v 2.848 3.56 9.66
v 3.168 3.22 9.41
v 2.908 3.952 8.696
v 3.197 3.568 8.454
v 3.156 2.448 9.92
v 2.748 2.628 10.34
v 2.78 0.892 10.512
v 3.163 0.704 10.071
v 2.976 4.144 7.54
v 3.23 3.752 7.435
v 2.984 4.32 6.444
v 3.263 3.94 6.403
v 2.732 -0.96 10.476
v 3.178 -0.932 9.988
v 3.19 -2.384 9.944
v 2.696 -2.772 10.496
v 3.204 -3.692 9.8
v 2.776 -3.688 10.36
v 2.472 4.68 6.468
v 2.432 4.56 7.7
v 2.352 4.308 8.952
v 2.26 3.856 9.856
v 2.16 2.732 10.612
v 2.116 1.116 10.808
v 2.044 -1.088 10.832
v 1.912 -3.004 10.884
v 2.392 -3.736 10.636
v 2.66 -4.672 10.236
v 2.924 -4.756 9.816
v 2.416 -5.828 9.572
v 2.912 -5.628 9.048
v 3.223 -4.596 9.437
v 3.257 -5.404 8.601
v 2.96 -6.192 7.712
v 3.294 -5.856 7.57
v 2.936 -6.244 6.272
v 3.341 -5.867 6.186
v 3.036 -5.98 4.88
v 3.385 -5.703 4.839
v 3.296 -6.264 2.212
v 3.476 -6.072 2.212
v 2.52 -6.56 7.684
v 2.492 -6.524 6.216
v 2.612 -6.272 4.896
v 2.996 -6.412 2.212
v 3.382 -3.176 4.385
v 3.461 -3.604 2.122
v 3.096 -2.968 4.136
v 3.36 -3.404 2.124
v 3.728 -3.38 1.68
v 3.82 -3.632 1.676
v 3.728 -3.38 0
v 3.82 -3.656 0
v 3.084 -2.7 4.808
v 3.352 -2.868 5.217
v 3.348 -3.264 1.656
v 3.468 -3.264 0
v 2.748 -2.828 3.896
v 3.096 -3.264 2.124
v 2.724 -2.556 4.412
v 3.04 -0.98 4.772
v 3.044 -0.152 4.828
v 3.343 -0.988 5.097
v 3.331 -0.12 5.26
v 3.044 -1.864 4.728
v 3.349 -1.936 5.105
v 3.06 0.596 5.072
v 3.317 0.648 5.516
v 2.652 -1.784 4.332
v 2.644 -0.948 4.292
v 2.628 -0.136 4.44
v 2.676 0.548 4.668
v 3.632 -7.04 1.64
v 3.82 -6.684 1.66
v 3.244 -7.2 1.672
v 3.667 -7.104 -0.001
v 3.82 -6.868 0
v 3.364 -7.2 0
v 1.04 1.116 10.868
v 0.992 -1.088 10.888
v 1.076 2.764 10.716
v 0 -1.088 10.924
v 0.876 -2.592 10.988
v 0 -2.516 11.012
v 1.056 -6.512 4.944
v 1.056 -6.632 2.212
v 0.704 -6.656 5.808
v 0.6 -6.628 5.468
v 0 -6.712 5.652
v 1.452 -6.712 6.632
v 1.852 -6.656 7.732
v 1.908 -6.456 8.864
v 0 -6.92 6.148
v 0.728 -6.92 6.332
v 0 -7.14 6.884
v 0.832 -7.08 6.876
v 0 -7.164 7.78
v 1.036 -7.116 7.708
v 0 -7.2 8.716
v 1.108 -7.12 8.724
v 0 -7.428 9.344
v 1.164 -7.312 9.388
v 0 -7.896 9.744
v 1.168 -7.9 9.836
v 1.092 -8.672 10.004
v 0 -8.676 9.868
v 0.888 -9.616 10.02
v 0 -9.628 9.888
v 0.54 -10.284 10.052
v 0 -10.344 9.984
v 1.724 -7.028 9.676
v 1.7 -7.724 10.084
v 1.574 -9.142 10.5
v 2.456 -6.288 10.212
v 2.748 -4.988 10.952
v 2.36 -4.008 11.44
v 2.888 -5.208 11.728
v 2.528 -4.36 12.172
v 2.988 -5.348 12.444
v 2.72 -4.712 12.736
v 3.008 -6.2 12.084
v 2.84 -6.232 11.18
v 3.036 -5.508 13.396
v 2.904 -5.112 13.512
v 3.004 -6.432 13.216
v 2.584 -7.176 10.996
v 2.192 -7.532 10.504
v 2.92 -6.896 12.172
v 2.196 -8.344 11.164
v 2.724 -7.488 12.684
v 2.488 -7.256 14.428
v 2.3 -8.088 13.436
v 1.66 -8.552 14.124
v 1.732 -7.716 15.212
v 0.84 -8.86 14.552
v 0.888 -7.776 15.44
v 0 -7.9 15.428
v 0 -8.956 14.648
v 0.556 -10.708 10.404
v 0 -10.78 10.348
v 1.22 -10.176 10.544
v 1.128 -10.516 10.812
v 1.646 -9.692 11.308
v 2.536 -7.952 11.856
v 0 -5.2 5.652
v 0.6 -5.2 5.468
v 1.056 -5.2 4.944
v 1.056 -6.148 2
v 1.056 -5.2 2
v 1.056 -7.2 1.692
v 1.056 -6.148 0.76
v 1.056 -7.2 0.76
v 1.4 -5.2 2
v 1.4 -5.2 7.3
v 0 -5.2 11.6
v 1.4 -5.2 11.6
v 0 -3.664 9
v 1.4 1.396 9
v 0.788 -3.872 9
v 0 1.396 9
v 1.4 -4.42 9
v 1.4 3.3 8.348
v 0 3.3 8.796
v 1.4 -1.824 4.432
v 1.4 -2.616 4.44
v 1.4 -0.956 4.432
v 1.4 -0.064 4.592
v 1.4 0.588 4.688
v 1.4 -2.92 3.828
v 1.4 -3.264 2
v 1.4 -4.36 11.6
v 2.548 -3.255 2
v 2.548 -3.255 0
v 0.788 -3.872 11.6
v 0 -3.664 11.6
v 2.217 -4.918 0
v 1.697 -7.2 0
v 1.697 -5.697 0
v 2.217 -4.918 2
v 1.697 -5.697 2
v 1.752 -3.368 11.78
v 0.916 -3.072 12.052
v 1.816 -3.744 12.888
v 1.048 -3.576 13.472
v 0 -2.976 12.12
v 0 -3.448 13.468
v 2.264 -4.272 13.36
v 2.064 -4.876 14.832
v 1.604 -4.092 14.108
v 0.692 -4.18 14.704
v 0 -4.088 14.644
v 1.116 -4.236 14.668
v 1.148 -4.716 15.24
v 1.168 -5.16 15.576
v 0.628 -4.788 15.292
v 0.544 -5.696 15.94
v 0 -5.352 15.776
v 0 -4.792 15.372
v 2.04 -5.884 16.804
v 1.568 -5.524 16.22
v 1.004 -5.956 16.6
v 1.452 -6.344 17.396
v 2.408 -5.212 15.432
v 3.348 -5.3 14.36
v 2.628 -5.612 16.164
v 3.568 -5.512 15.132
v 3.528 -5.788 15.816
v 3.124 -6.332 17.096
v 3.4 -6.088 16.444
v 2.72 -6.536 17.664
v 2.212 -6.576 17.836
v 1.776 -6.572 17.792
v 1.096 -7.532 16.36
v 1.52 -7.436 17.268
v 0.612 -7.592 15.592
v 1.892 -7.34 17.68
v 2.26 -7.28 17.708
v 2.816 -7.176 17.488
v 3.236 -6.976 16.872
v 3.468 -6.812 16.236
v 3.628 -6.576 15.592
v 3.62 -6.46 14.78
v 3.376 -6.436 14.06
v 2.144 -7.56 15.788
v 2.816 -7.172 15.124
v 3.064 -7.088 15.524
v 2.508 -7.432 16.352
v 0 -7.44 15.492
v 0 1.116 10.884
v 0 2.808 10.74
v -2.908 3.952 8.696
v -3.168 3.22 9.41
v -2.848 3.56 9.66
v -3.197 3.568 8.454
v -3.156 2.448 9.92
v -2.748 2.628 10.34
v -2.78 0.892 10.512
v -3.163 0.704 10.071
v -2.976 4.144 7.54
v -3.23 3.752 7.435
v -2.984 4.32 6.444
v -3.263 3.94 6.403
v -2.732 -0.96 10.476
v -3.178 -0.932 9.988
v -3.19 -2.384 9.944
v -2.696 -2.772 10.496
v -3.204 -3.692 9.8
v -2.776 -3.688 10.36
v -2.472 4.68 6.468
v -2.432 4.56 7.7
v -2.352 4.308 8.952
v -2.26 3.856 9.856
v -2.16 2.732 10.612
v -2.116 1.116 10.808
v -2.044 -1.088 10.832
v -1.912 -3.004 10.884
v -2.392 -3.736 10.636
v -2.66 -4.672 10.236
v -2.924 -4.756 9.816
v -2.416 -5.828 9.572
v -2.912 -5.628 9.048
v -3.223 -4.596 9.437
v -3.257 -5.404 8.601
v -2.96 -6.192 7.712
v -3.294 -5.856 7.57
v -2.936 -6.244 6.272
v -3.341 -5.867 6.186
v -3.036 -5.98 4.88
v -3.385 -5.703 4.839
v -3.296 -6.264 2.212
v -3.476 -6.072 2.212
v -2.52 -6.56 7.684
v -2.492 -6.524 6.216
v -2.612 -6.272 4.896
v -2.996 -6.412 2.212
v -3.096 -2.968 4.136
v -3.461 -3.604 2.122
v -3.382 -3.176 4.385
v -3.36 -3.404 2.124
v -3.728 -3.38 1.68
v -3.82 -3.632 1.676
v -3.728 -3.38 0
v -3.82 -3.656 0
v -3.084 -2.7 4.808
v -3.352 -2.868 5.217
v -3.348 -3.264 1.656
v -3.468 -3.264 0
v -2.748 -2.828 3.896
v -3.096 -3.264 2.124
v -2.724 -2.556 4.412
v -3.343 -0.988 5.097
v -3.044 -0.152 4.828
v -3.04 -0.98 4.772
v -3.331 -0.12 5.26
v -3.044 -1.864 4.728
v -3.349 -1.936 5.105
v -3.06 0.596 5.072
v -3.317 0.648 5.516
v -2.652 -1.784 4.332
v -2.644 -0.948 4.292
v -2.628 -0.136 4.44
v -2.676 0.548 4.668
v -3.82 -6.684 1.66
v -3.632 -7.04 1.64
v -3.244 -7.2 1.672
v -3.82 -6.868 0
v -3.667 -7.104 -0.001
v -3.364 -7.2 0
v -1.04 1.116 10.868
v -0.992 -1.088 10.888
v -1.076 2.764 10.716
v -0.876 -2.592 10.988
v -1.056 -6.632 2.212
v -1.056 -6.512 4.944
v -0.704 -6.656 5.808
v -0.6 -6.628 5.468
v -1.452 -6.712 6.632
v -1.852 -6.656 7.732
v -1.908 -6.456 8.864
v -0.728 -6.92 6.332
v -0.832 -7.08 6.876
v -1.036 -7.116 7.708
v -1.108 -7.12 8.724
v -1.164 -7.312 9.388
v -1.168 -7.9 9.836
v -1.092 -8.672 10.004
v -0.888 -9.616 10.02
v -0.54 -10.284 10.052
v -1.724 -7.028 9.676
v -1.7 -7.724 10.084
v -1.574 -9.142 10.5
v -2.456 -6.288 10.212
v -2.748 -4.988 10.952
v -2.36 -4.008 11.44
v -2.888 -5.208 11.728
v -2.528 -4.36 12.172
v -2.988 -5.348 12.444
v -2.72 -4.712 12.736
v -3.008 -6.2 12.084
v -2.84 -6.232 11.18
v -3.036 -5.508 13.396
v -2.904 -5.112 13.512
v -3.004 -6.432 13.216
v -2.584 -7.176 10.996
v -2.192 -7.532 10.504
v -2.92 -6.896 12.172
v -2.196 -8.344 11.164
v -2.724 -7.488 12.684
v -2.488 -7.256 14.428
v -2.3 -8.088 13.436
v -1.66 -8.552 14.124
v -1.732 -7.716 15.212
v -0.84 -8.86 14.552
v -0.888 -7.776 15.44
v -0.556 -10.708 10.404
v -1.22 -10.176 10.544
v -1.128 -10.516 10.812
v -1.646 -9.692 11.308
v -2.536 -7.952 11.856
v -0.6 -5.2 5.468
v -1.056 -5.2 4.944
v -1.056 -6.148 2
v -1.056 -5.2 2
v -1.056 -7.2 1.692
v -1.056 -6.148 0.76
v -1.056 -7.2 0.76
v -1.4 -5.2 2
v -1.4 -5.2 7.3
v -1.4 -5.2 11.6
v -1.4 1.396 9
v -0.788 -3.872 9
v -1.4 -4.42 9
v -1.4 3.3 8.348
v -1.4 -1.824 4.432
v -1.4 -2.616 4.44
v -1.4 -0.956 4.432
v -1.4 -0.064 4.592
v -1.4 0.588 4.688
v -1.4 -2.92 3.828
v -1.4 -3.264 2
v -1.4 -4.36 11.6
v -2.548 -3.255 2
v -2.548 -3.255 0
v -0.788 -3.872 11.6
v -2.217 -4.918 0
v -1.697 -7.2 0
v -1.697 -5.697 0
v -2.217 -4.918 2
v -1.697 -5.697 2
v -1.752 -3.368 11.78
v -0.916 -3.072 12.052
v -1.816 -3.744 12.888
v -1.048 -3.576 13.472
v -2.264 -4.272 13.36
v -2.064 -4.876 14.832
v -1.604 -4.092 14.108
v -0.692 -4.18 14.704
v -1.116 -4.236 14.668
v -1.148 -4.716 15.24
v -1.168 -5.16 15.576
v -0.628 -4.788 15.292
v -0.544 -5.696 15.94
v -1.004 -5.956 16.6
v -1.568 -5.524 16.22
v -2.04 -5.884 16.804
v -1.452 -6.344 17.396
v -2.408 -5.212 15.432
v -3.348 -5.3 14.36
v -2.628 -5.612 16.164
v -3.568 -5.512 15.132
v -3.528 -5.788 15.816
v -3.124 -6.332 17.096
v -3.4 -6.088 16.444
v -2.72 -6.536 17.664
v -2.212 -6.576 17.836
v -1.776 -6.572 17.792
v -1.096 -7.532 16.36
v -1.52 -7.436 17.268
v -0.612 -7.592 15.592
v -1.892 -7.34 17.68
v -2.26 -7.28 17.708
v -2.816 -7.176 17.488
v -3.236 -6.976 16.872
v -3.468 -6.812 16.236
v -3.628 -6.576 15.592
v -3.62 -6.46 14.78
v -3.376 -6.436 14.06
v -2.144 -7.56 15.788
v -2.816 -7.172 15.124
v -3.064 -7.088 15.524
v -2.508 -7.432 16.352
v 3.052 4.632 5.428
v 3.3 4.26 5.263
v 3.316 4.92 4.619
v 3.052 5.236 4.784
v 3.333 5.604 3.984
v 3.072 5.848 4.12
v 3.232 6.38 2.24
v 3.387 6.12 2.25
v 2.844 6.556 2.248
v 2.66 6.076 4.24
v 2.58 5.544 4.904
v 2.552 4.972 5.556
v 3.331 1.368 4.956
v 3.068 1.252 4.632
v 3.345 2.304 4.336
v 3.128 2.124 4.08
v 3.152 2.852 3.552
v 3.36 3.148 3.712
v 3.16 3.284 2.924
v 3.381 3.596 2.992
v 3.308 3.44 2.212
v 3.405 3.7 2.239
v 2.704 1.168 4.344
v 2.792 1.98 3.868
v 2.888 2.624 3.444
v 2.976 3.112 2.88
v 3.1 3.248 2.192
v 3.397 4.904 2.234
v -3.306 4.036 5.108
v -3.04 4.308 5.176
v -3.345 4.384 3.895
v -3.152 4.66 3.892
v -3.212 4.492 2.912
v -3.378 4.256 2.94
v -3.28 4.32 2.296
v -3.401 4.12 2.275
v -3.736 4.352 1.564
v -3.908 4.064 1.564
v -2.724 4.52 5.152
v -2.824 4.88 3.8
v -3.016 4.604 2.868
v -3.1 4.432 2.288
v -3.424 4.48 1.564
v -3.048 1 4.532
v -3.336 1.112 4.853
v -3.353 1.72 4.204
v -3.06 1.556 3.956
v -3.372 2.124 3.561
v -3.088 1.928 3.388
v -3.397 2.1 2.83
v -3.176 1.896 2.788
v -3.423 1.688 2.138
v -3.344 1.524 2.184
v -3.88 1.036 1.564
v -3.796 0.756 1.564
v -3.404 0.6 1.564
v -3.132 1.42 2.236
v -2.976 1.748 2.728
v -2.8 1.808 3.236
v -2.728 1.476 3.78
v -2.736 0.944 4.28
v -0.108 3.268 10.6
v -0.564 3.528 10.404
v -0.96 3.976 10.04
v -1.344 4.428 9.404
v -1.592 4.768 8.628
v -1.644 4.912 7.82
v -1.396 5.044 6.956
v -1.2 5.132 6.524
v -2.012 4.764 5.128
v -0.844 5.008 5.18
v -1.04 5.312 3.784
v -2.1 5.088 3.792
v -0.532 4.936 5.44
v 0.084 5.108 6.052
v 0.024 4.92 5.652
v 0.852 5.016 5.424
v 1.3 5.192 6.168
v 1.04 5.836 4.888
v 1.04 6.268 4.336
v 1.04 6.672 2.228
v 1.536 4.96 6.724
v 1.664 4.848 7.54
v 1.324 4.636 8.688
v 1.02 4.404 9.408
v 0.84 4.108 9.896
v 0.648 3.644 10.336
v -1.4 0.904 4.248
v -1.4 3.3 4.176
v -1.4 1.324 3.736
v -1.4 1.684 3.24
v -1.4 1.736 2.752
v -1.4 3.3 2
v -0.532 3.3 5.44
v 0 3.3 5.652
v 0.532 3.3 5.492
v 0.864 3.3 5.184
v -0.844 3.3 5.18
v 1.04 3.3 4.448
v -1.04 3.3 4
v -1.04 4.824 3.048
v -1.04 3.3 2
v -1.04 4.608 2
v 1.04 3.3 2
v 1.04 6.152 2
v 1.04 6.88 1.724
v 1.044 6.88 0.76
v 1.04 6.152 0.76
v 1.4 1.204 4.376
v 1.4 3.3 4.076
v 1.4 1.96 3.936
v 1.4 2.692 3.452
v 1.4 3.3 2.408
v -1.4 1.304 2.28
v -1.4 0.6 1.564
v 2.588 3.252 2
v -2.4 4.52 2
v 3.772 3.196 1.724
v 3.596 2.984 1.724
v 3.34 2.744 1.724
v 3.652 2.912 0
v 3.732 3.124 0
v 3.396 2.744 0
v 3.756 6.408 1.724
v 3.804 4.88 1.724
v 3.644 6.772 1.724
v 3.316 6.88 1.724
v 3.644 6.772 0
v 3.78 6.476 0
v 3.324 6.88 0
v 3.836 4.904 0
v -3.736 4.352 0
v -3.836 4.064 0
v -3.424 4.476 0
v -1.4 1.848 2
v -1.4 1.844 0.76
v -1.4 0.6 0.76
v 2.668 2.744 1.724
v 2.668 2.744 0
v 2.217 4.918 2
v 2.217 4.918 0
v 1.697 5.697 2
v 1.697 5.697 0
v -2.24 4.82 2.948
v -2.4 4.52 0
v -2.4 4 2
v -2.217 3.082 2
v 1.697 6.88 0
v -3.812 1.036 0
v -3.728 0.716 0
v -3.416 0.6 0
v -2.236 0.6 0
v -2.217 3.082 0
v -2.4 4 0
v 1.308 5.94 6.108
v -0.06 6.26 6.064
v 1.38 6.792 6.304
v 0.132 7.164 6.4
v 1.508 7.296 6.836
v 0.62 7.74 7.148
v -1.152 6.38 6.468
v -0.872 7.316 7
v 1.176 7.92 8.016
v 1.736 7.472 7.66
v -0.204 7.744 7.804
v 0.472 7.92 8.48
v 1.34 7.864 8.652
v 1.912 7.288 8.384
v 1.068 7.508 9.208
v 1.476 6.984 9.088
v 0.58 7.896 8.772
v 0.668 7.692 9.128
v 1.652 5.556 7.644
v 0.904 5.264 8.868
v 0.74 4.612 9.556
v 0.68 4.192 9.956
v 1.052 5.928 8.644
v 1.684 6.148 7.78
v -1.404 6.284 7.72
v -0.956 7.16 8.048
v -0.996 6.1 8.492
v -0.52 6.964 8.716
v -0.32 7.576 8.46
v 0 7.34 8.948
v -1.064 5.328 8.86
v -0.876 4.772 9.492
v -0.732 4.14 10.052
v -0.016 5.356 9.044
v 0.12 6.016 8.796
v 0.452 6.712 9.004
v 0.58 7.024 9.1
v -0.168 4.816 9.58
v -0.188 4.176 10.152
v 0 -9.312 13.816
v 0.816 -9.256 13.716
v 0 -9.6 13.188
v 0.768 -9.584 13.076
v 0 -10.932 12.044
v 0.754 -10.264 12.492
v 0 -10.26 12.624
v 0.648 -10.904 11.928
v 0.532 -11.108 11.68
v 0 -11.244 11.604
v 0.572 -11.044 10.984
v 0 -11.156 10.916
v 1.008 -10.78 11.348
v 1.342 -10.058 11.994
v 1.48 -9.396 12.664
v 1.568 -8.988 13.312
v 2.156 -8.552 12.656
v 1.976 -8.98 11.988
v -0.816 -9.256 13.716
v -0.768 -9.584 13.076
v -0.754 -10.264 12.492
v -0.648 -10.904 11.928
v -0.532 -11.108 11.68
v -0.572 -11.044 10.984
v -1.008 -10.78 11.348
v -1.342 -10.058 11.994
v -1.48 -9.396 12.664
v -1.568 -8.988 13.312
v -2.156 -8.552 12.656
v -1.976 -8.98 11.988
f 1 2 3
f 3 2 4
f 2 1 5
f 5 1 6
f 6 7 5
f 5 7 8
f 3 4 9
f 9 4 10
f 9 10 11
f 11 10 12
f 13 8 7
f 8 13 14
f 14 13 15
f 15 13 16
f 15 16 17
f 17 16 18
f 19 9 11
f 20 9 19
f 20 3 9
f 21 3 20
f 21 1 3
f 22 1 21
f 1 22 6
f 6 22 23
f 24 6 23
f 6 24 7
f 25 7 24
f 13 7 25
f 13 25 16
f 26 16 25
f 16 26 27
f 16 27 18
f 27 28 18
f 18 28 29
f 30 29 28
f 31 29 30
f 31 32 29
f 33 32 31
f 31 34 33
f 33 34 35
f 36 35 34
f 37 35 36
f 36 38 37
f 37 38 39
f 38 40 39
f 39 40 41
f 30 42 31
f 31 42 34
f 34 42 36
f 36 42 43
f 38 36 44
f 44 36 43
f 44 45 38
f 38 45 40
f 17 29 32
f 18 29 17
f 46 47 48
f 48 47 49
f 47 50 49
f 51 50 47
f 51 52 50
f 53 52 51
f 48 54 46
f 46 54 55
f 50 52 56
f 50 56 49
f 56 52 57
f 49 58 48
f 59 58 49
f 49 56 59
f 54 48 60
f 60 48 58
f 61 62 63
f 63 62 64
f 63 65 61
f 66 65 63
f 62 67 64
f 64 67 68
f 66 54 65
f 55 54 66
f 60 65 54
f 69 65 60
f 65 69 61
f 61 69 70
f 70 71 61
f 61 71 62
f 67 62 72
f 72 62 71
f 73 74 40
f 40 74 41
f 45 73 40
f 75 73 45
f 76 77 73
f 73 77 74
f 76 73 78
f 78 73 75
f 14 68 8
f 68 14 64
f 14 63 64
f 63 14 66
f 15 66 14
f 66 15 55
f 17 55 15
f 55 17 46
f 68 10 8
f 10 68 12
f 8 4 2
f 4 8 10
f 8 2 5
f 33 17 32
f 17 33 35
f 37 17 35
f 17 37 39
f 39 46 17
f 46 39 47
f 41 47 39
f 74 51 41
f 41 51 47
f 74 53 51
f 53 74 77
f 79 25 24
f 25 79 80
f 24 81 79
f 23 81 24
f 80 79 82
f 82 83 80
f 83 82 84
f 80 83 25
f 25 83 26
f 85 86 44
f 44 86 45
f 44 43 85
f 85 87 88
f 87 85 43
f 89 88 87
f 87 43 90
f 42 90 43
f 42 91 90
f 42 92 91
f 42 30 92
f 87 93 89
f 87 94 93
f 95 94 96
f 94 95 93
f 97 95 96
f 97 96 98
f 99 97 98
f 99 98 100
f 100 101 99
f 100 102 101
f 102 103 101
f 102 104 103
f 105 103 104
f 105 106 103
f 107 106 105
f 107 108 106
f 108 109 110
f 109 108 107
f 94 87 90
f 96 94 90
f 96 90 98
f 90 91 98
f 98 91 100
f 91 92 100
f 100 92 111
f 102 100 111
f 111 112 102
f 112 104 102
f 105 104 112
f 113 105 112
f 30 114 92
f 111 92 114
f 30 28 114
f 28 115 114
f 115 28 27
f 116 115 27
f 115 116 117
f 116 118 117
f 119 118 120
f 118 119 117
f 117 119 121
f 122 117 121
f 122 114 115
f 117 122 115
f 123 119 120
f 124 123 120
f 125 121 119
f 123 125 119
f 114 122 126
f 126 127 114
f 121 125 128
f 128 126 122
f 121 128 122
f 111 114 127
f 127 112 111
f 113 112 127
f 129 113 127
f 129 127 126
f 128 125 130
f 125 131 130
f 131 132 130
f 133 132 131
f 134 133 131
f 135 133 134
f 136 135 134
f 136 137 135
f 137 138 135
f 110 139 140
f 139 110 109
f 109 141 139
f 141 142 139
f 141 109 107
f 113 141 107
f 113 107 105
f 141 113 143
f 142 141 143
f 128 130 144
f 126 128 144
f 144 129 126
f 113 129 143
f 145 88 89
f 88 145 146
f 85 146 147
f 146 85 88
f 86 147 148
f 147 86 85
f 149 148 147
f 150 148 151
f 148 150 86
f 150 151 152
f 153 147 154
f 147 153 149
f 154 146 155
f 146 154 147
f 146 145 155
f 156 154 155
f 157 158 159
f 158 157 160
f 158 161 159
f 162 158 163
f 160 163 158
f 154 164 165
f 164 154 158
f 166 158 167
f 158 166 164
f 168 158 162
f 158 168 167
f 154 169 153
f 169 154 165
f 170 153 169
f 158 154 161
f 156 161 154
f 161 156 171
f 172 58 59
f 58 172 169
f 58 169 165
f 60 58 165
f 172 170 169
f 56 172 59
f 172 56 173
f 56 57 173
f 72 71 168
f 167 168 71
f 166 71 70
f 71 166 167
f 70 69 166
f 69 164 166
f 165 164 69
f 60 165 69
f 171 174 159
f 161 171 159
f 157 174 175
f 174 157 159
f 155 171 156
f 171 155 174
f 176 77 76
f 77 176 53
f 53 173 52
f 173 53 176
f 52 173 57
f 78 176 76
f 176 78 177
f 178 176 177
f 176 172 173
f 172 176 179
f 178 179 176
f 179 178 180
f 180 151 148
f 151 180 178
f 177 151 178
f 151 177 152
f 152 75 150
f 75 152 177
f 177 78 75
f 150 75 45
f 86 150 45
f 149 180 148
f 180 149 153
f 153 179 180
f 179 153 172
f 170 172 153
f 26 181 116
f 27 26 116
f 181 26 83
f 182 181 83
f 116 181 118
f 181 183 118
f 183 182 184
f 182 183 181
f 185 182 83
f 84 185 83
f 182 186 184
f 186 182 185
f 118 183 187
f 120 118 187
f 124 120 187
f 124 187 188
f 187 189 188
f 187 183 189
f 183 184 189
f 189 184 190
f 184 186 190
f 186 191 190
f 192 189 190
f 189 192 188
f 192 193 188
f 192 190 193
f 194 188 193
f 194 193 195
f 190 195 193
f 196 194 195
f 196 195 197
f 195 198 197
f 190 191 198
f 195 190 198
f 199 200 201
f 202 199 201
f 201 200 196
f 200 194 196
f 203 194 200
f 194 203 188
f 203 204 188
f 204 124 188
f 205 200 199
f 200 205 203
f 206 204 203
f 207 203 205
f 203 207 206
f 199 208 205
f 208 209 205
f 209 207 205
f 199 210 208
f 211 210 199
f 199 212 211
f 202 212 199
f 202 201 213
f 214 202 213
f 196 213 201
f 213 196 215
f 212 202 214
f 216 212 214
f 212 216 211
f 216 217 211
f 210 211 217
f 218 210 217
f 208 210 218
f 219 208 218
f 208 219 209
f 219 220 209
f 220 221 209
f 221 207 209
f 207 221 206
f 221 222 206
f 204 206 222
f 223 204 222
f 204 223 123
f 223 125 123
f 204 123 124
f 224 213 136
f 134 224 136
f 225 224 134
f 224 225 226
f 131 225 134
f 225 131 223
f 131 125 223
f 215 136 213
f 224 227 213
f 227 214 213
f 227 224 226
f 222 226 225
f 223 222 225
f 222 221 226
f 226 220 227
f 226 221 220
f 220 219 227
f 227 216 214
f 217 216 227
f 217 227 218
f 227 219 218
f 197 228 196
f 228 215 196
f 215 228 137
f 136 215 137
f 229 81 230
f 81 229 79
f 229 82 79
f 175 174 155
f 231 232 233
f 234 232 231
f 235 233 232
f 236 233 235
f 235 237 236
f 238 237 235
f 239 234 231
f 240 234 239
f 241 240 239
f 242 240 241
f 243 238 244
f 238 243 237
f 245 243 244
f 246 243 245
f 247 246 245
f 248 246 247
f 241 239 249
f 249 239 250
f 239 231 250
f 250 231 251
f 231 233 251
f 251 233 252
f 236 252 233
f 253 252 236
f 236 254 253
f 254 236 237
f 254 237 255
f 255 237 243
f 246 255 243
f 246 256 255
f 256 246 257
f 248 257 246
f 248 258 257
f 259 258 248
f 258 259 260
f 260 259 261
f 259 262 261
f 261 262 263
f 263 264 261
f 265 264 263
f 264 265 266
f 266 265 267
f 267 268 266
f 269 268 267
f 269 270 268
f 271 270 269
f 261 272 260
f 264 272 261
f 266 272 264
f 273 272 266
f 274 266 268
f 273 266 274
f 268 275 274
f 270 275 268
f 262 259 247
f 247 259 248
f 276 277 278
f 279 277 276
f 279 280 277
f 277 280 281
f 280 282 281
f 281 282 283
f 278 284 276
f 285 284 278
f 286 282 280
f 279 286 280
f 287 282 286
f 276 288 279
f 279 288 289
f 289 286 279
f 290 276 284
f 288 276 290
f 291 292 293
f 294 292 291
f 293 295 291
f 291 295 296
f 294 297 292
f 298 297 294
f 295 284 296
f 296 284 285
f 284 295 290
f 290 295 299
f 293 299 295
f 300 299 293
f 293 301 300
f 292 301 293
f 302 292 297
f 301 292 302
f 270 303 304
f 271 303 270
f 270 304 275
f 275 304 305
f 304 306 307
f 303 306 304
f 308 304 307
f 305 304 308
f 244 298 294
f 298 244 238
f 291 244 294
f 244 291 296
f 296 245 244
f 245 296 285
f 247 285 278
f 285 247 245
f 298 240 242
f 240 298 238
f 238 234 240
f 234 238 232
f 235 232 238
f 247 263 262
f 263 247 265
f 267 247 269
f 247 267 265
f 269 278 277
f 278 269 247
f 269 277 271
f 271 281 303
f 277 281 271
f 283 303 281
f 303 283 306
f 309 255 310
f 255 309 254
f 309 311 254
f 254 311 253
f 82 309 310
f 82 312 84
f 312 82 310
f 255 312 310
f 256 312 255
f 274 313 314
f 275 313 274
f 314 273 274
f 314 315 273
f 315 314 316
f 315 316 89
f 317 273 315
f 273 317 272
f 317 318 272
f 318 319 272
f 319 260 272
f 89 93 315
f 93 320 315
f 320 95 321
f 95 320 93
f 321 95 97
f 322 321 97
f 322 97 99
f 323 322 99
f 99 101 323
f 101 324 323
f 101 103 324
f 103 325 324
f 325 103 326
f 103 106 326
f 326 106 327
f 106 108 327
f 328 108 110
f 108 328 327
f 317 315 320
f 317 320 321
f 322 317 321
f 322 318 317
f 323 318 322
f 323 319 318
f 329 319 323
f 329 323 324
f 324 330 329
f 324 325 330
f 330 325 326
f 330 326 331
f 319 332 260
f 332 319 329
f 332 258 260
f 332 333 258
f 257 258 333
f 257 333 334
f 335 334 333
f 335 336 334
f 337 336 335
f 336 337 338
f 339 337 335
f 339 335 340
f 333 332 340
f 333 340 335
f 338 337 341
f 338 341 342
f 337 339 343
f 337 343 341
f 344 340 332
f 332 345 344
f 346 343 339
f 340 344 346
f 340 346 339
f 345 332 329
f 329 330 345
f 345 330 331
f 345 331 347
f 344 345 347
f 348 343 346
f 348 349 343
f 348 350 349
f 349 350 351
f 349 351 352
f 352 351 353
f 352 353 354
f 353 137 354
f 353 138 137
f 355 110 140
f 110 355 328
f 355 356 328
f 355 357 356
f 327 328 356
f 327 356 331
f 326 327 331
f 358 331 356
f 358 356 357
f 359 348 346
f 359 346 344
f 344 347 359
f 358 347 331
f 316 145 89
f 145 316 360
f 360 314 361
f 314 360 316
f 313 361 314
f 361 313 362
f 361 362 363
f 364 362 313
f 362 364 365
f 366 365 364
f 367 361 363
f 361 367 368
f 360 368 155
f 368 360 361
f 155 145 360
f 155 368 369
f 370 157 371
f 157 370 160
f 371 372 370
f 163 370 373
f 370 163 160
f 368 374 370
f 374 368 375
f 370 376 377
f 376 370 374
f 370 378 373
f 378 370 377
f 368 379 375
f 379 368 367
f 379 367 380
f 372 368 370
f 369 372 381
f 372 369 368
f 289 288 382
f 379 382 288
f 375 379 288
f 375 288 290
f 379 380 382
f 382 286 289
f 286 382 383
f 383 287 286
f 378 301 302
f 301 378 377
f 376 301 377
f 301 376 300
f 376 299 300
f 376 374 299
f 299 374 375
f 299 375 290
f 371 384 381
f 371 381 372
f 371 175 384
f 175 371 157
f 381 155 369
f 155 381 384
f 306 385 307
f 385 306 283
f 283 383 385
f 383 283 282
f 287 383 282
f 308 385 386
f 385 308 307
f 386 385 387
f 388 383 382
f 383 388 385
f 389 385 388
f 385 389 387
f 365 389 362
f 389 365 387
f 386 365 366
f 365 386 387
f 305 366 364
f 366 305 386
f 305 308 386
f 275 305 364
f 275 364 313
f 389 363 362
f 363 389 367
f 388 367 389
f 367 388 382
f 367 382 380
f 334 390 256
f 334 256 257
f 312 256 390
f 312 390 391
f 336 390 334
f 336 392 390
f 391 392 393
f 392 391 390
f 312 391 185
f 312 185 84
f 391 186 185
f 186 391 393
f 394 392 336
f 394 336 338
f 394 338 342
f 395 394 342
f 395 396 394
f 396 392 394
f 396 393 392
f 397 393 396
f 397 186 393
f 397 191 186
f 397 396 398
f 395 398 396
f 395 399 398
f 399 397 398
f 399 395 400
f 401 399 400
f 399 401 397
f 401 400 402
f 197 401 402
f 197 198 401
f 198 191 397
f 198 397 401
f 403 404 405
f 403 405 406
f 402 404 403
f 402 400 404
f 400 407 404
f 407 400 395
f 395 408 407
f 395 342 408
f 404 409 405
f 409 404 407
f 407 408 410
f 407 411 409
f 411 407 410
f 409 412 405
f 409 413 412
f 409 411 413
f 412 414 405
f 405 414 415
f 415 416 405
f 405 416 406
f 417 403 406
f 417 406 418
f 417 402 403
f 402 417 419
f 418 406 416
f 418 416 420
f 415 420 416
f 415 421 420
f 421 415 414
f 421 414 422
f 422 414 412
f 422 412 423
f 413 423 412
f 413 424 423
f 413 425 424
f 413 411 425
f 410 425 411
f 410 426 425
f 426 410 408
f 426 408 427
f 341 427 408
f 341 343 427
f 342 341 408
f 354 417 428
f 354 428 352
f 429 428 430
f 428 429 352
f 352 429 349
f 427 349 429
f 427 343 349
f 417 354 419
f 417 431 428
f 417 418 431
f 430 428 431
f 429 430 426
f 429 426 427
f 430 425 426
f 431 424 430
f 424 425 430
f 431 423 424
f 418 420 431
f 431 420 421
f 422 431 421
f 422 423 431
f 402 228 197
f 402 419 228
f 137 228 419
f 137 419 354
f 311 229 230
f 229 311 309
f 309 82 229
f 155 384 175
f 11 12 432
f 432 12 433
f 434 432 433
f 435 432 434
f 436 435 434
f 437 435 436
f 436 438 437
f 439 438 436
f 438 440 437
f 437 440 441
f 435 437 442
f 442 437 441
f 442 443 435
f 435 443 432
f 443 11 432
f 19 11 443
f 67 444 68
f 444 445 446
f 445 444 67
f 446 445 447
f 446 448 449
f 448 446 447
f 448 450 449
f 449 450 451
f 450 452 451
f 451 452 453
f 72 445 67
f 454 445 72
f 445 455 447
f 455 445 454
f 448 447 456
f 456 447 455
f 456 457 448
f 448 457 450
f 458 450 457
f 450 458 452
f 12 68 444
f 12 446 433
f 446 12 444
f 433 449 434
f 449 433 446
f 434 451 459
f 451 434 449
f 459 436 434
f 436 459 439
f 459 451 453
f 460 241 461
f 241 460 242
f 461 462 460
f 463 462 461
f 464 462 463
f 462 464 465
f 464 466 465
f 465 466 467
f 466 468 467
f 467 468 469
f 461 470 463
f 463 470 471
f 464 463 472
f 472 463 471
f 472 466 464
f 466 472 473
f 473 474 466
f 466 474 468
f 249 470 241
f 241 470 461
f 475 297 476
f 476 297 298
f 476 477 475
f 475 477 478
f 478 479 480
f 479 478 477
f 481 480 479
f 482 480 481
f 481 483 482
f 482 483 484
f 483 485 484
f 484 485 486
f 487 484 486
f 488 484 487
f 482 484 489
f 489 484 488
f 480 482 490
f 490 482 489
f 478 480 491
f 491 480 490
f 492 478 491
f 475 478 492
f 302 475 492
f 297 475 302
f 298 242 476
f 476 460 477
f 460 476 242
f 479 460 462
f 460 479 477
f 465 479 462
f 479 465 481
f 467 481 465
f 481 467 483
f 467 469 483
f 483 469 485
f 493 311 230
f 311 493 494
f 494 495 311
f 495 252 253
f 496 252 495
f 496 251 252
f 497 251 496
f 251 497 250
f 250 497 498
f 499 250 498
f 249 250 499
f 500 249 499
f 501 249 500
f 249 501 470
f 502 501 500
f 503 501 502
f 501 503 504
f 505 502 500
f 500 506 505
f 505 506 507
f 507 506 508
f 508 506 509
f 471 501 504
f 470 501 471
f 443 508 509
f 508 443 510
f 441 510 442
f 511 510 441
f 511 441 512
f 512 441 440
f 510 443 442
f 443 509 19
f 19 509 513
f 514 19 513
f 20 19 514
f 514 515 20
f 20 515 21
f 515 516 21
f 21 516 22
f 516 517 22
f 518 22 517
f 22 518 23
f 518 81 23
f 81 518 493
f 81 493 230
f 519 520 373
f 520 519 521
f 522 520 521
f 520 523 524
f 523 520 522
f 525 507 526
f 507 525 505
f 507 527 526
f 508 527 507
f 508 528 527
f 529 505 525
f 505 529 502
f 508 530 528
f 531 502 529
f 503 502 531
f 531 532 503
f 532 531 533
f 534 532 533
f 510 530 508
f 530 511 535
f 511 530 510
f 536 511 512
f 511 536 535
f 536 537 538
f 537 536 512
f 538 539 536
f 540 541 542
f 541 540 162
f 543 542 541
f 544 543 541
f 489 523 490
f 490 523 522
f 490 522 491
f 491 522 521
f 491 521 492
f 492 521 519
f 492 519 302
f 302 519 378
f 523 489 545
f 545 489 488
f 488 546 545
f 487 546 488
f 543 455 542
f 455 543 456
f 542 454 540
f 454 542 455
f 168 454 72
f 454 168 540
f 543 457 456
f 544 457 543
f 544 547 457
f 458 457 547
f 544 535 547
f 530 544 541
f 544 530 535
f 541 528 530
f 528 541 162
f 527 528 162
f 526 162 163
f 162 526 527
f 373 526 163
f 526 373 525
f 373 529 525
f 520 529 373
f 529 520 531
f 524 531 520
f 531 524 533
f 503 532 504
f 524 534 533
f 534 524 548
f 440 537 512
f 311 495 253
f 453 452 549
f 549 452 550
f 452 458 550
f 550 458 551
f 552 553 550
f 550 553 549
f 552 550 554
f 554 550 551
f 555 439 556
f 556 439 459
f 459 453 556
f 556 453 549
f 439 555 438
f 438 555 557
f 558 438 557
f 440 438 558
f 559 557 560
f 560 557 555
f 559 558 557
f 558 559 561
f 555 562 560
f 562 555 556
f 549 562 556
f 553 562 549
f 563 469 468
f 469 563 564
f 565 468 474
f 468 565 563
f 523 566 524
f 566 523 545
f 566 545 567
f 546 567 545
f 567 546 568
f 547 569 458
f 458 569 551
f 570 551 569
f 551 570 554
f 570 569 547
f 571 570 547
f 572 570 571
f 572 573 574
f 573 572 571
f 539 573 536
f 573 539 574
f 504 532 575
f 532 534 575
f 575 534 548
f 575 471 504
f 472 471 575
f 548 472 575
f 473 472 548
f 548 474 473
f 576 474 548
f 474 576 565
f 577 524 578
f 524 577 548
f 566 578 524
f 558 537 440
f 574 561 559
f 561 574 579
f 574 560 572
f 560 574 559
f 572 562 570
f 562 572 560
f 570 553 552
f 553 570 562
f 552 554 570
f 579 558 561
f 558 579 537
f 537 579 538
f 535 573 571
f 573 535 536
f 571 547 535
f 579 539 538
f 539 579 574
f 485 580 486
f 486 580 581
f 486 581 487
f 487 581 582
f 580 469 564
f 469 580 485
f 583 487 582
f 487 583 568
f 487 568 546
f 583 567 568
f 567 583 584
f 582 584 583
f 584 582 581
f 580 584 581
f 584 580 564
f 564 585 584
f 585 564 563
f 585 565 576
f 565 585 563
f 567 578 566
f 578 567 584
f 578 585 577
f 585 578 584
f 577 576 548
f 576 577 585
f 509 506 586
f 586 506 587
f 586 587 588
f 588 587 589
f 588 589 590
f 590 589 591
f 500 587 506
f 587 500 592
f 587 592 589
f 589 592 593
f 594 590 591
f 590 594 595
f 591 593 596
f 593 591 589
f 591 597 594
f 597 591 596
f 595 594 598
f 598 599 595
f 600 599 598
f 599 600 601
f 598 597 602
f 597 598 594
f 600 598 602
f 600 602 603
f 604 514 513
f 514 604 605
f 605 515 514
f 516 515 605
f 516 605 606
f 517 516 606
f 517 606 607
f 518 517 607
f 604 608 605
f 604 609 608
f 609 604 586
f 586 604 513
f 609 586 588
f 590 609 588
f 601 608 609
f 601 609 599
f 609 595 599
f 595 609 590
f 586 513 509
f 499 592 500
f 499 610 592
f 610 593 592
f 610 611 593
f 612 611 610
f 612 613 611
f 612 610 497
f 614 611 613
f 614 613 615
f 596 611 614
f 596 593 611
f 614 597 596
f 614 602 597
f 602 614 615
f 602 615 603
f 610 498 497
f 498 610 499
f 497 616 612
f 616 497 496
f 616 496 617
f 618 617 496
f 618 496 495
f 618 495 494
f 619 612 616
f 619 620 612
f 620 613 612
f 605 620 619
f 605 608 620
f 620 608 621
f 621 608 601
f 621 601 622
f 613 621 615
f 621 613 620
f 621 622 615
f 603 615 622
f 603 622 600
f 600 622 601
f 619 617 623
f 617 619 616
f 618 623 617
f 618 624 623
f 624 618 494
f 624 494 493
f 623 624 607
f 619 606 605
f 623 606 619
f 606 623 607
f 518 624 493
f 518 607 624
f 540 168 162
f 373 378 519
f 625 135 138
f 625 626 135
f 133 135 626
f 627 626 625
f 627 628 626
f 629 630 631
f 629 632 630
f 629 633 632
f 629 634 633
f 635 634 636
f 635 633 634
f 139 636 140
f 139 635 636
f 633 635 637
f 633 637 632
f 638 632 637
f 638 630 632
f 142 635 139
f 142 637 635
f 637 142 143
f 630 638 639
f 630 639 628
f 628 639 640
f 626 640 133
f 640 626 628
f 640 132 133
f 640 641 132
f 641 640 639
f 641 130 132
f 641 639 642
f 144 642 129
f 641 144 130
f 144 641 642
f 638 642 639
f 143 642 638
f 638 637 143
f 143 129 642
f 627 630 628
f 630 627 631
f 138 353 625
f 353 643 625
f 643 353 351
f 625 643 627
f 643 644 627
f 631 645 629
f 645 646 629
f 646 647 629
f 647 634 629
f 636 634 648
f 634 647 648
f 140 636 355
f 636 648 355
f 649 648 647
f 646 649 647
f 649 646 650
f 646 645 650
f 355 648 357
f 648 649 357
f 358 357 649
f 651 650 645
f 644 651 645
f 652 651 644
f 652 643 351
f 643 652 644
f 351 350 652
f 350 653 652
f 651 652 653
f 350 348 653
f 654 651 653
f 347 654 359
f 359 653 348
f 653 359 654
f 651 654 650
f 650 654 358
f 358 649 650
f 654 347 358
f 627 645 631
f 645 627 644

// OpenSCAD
use <../lib.scad>
use <s/2889s01.scad>
use <s/2889s03.scad>
function ldraw_lib__2889() = [
// 0 Animal Dog Alsatian / German Shepherd Puppy
// 0 Name: 2889.dat
// 0 Author: Philippe Hurbain [Philo]
// 0 !LDRAW_ORG Part UPDATE 2026-03
// 0 !LICENSE Licensed under CC BY 4.0 : see CAreadme.txt
// 
// 0 BFC CERTIFY CCW
  [0,"BFC","CERTIFY"],
  [0,"BFC","CCW"],
// 
// 0 !HISTORY 2025-02-14 {LEGO Instructions App} Original part shape
// 0 !HISTORY 2025-02-14 [Philo] File preparation for LDraw Parts Tracker
// 0 !HISTORY 2026-03-31 [OrionP] Official Update 2026-03
// 
// 1 16 0 0 0 1 0 0 0 1 0 0 0 1 s\2889s01.dat
  [1,16,0,0,0,1,0,0,0,1,0,0,0,1, ldraw_lib__s__2889s01()],
// 1 16 0 0 0 1 0 0 0 1 0 0 0 1 s\2889s03.dat
  [1,16,0,0,0,1,0,0,0,1,0,0,0,1, ldraw_lib__s__2889s03()],
// 1 16 0 0 0 -1 0 0 0 1 0 0 0 1 s\2889s03.dat
  [1,16,0,0,0,-1,0,0,0,1,0,0,0,1, ldraw_lib__s__2889s03()],
];
module ldraw_lib__2889(step=0, col=false, unit=2/5, alt=false, line=0.2, solid=!$preview)
    makepoly(ldraw_lib__2889(), step=step, col=col, unit=unit, alt=alt, line=line, solid=solid);
ldraw_lib__2889(line=0.2);
